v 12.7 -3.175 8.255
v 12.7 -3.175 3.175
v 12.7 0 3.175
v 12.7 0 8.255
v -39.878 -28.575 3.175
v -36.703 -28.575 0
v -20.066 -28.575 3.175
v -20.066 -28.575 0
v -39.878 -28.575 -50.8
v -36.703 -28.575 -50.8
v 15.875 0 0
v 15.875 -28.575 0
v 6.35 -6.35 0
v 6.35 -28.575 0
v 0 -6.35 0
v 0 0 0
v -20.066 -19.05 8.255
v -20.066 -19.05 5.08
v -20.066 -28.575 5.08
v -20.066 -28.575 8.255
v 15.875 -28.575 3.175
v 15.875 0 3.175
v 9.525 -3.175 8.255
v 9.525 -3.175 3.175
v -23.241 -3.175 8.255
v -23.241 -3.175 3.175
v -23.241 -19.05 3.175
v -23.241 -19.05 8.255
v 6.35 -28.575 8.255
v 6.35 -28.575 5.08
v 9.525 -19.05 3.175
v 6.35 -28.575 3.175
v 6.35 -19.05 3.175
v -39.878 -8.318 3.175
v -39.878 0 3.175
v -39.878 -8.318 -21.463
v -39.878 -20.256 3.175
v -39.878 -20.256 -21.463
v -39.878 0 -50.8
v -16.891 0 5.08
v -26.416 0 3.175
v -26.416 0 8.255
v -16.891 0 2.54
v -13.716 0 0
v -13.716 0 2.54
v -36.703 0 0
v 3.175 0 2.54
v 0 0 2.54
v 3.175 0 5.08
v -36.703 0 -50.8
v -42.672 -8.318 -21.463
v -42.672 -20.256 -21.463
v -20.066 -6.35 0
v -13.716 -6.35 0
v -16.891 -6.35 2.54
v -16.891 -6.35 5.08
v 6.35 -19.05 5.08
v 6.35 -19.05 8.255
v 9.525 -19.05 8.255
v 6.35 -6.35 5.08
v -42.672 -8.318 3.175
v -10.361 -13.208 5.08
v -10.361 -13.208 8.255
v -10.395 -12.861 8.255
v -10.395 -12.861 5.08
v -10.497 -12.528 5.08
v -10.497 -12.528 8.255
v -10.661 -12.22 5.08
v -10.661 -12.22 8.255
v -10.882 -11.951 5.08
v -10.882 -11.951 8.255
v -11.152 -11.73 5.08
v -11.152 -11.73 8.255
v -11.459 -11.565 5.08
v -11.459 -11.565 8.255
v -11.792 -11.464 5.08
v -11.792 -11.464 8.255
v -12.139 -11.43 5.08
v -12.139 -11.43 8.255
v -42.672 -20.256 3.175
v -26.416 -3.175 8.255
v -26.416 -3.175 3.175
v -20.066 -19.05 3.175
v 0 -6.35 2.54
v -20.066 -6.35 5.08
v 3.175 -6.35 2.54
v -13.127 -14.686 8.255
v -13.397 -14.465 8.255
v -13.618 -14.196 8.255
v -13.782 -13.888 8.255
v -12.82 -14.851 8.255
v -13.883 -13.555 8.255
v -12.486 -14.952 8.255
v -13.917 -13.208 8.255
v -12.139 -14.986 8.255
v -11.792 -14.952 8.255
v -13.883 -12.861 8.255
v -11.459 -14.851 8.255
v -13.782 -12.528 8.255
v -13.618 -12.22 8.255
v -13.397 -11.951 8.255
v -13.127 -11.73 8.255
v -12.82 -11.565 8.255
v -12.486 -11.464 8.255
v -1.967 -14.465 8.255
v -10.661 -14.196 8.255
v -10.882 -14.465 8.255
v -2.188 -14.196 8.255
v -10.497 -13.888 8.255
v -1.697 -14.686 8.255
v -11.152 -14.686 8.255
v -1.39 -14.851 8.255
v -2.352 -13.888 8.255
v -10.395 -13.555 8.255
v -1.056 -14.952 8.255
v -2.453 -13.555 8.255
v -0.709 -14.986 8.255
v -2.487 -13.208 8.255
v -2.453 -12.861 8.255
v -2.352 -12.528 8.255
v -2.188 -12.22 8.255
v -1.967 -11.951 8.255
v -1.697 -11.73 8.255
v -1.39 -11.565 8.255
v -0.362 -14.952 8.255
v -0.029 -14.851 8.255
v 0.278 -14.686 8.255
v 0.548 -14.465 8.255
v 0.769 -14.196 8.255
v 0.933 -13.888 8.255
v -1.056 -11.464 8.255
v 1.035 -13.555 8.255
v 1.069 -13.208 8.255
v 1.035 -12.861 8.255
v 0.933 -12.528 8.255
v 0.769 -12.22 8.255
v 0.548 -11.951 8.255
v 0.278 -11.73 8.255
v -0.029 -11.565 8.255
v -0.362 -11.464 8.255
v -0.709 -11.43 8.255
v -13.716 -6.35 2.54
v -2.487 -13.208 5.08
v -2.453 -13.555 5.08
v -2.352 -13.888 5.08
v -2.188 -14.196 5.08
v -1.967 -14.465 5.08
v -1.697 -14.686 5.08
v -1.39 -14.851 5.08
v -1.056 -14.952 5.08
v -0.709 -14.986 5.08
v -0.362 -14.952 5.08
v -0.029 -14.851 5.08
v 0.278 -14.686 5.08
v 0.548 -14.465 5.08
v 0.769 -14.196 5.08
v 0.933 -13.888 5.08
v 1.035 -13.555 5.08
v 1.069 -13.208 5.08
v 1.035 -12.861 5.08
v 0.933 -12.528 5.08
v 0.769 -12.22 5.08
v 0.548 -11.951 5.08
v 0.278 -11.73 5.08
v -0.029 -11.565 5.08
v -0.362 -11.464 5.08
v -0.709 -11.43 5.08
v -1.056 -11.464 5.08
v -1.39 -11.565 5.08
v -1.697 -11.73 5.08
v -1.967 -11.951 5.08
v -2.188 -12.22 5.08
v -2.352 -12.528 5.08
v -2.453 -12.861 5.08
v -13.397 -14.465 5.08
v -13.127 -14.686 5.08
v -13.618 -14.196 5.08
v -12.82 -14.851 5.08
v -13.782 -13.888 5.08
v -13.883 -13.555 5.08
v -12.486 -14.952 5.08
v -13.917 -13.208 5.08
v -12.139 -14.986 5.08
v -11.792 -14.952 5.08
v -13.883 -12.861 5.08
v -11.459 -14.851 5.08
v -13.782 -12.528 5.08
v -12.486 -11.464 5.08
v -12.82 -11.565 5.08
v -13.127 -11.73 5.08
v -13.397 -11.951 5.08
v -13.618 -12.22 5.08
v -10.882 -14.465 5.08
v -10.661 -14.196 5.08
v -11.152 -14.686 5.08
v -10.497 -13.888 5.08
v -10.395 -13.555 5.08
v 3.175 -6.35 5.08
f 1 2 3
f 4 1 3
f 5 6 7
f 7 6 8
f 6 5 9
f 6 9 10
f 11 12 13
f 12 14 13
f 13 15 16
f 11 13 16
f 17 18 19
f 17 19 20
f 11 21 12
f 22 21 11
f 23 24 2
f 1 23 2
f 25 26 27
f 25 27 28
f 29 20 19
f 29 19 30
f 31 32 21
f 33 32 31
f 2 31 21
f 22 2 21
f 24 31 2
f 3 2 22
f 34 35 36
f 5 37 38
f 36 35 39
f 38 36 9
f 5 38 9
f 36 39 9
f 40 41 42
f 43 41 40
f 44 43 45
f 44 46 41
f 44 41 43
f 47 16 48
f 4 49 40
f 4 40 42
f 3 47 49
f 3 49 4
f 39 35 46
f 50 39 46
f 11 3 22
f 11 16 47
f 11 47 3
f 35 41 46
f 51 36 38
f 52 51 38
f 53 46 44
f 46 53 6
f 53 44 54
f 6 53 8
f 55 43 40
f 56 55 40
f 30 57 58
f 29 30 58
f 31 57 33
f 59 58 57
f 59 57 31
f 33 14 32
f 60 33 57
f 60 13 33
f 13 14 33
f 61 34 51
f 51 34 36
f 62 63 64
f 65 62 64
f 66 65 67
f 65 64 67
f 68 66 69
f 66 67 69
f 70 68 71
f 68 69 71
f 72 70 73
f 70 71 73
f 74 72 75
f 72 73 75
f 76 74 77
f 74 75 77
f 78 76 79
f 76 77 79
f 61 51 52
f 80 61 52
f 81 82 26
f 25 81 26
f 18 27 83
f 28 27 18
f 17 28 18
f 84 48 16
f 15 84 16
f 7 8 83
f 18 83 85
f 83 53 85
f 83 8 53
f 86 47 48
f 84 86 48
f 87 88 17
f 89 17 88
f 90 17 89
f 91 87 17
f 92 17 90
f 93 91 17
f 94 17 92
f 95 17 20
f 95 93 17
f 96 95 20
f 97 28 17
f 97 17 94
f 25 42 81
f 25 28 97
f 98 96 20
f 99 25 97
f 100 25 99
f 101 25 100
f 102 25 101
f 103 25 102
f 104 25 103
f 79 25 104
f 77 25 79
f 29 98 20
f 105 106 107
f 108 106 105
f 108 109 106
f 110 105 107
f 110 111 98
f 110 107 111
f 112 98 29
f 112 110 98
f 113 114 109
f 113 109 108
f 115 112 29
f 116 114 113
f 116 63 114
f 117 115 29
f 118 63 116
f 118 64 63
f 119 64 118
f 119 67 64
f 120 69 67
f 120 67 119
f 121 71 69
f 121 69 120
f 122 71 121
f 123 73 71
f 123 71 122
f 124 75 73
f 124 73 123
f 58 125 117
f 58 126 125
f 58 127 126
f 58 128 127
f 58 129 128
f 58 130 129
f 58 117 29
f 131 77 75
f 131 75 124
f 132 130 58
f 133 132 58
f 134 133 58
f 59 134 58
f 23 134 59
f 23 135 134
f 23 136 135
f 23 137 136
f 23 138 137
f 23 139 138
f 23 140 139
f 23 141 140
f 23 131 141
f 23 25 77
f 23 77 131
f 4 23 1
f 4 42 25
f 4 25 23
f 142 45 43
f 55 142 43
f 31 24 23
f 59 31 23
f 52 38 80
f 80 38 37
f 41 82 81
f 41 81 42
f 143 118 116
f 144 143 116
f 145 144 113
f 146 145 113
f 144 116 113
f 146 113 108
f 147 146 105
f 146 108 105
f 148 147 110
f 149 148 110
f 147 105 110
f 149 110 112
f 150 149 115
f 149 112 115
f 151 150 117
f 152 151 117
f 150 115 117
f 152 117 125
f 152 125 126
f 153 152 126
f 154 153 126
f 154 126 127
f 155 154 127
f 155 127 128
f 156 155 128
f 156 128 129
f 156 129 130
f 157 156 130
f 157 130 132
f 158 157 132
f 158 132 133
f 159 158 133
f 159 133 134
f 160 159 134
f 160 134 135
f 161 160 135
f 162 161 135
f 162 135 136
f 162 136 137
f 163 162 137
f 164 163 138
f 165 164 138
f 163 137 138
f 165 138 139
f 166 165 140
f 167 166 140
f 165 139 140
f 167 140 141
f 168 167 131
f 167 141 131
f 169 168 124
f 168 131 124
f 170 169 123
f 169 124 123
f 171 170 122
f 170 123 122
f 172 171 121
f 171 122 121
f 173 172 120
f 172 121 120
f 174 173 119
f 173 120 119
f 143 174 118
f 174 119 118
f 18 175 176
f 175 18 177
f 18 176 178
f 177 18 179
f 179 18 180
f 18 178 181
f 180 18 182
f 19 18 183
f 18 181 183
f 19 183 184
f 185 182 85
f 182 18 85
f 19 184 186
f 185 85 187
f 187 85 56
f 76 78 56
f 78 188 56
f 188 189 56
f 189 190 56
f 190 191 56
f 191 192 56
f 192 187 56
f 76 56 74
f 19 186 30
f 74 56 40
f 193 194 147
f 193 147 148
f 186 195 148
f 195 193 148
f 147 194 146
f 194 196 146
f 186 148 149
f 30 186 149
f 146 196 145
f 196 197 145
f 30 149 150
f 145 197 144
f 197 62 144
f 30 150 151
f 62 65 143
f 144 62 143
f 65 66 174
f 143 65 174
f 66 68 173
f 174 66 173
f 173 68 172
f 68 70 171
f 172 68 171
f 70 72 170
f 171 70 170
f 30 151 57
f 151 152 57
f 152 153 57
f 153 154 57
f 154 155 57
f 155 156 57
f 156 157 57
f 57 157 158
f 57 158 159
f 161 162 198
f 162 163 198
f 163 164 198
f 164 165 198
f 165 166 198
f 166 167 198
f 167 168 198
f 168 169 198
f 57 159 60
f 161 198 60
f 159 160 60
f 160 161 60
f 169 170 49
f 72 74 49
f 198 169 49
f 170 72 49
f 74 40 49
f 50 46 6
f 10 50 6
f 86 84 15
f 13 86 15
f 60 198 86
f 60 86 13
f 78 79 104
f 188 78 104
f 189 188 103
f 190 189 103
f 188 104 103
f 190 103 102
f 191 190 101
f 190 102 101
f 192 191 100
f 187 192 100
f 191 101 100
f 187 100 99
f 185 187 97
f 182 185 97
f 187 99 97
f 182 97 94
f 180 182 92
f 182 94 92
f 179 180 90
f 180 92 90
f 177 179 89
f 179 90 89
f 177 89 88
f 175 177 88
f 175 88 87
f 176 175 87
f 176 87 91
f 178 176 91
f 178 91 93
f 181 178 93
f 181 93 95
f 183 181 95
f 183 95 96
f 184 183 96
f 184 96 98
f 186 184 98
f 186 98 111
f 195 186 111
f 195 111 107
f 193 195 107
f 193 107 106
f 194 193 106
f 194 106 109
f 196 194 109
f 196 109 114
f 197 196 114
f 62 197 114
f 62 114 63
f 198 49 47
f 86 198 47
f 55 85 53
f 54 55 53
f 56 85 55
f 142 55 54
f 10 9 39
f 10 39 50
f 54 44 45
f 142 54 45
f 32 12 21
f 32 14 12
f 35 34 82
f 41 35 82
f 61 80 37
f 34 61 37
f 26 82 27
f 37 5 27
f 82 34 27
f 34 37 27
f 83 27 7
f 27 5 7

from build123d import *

# Parameters (mm, degrees)
F1_DEPTH       = 6.35
F2_W           = 26.416
F2_H           = 3.175
F3_DEPTH       = 22.225
F4_W           = 3.175
F4_H           = 19.05
F5_DEPTH       = 8.255
F6_W           = 3.175
F6_H           = 3.175
F7_DEPTH       = 9.525
F8_W           = 3.175
F8_H           = 3.175
F9_DEPTH       = 9.525
F10_W          = 28.575
F10_H          = 3.175
F11_DEPTH      = 13.462
F12_W          = 3.175
F12_H          = 28.575
F13_DEPTH      = 50.8
F13_DEPTH_BACK = 3.175
F15_DEPTH      = 2.794
F17_DEPTH      = 25.4
F18_W          = 3.175
F18_H          = 3.175
F19_DEPTH      = 5.08
F20_W          = 28.575
F20_H          = 3.175
F21_DEPTH      = 6.35
F22_W          = 3.175
F22_H          = 3.175
F23_DEPTH      = 5.08


with BuildPart() as f1:
    # F0 (on Front) → F1 (new body)
    with BuildSketch(Plane.XZ):
        Polygon((0, 2.54), (0, 0), (3.175, 0), (6.35, 0), (6.35, 5.08), (6.35, 8.255), (-20.066, 8.255), (-20.066, 5.08), (-20.066, 0), (-16.891, 0), (-13.716, 0), (-13.716, 2.54), (-16.891, 2.54), (-16.891, 5.08), (3.175, 5.08), (3.175, 2.54), align=None)
    extrude(amount=F1_DEPTH)

    # F2 (on face) → F3 (join)
    with BuildSketch(Plane.XZ.offset(6.35)):
        with Locations((-6.858, 6.6675)):
            Rectangle(F2_W, F2_H)
    extrude(amount=F3_DEPTH)

    # F4 (on face) → F5 (join, through all)
    with BuildSketch(Plane.XY.offset(8.255)):
        with Locations((-21.6535, -9.525)):
            Rectangle(F4_W, F4_H)
        with Locations((7.9375, -9.525)):
            Rectangle(F4_W, F4_H)
    extrude(amount=-F5_DEPTH)

    # F6 (on face) → F7 (join, through all)
    with BuildSketch(Plane.XZ.offset(19.05)):
        with Locations((-21.6535, 1.5875)):
            Rectangle(F6_W, F6_H)
    extrude(amount=F7_DEPTH)

    # F8 (on face) → F9 (join, through all)
    with BuildSketch(Plane.XZ.offset(19.05)):
        with Locations((7.9375, 1.5875)):
            Rectangle(F8_W, F8_H)
    extrude(amount=F9_DEPTH)

    # F10 (on face) → F11 (join)
    with BuildSketch(Plane(origin=(-23.241, 0, 0), x_dir=(0, -1, 0), z_dir=(-1, 0, 0))):
        with Locations((14.2875, 1.5875)):
            Rectangle(F10_W, F10_H)
    extrude(amount=F11_DEPTH)

    # F12 (on face) → F13 (join, two sides)
    with BuildSketch(Plane(origin=(0, 0, 0), x_dir=(1, 0, 0), z_dir=(0, 0, -1))) as f13_sk:
        with Locations((-38.2905, 14.2875)):
            Rectangle(F12_W, F12_H)
    extrude(amount=F13_DEPTH)
    extrude(f13_sk.sketch, amount=-F13_DEPTH_BACK)

    # F14 (on face) → F15 (join)
    with BuildSketch(Plane(origin=(-39.878, 0, 0), x_dir=(0, -1, 0), z_dir=(-1, 0, 0))):
        Polygon((20.2565, 3.175), (14.2875, 3.175), (8.3185, 3.175), (8.3185, -21.463), (20.2565, -21.463), align=None)
    extrude(amount=F15_DEPTH)

    # F16 (on face) → F17 (cut)
    with BuildSketch(Plane.XY.offset(8.255)):
        with BuildLine():
            ThreePointArc((-10.361326316, -13.208), (-10.882090459, -11.9507641431), (-12.139326316, -11.43))
            Line((-12.139326316, -11.43), (-12.139326316, -13.208))
            Line((-12.139326316, -13.208), (-10.361326316, -13.208))
        make_face()
        with BuildLine():
            ThreePointArc((1.068673684, -13.208), (-0.709326316, -11.43), (-2.487326316, -13.208))
            ThreePointArc((-2.487326316, -13.208), (-0.709326316, -14.986), (1.068673684, -13.208))
        make_face()
        with BuildLine():
            Line((-12.139326316, -13.208), (-12.139326316, -11.43))
            ThreePointArc((-12.139326316, -11.43), (-13.3965621729, -14.4652358569), (-10.361326316, -13.208))
            Line((-10.361326316, -13.208), (-12.139326316, -13.208))
        make_face()
    extrude(amount=-F17_DEPTH, mode=Mode.SUBTRACT)

    # F18 (on face) → F19 (join, through all)
    with BuildSketch(Plane.XY.offset(3.175)):
        with Locations((-24.8285, -1.5875)):
            Rectangle(F18_W, F18_H)
    extrude(amount=F19_DEPTH)

    # F20 (on face) → F21 (join)
    with BuildSketch(Plane.YZ.offset(9.525)):
        with Locations((-14.2875, 1.5875)):
            Rectangle(F20_W, F20_H)
    extrude(amount=F21_DEPTH)

    # F22 (on face) → F23 (join, through all)
    with BuildSketch(Plane.XY.offset(3.175)):
        with Locations((11.1125, -1.5875)):
            Rectangle(F22_W, F22_H)
    extrude(amount=F23_DEPTH)


solid = f1.part
